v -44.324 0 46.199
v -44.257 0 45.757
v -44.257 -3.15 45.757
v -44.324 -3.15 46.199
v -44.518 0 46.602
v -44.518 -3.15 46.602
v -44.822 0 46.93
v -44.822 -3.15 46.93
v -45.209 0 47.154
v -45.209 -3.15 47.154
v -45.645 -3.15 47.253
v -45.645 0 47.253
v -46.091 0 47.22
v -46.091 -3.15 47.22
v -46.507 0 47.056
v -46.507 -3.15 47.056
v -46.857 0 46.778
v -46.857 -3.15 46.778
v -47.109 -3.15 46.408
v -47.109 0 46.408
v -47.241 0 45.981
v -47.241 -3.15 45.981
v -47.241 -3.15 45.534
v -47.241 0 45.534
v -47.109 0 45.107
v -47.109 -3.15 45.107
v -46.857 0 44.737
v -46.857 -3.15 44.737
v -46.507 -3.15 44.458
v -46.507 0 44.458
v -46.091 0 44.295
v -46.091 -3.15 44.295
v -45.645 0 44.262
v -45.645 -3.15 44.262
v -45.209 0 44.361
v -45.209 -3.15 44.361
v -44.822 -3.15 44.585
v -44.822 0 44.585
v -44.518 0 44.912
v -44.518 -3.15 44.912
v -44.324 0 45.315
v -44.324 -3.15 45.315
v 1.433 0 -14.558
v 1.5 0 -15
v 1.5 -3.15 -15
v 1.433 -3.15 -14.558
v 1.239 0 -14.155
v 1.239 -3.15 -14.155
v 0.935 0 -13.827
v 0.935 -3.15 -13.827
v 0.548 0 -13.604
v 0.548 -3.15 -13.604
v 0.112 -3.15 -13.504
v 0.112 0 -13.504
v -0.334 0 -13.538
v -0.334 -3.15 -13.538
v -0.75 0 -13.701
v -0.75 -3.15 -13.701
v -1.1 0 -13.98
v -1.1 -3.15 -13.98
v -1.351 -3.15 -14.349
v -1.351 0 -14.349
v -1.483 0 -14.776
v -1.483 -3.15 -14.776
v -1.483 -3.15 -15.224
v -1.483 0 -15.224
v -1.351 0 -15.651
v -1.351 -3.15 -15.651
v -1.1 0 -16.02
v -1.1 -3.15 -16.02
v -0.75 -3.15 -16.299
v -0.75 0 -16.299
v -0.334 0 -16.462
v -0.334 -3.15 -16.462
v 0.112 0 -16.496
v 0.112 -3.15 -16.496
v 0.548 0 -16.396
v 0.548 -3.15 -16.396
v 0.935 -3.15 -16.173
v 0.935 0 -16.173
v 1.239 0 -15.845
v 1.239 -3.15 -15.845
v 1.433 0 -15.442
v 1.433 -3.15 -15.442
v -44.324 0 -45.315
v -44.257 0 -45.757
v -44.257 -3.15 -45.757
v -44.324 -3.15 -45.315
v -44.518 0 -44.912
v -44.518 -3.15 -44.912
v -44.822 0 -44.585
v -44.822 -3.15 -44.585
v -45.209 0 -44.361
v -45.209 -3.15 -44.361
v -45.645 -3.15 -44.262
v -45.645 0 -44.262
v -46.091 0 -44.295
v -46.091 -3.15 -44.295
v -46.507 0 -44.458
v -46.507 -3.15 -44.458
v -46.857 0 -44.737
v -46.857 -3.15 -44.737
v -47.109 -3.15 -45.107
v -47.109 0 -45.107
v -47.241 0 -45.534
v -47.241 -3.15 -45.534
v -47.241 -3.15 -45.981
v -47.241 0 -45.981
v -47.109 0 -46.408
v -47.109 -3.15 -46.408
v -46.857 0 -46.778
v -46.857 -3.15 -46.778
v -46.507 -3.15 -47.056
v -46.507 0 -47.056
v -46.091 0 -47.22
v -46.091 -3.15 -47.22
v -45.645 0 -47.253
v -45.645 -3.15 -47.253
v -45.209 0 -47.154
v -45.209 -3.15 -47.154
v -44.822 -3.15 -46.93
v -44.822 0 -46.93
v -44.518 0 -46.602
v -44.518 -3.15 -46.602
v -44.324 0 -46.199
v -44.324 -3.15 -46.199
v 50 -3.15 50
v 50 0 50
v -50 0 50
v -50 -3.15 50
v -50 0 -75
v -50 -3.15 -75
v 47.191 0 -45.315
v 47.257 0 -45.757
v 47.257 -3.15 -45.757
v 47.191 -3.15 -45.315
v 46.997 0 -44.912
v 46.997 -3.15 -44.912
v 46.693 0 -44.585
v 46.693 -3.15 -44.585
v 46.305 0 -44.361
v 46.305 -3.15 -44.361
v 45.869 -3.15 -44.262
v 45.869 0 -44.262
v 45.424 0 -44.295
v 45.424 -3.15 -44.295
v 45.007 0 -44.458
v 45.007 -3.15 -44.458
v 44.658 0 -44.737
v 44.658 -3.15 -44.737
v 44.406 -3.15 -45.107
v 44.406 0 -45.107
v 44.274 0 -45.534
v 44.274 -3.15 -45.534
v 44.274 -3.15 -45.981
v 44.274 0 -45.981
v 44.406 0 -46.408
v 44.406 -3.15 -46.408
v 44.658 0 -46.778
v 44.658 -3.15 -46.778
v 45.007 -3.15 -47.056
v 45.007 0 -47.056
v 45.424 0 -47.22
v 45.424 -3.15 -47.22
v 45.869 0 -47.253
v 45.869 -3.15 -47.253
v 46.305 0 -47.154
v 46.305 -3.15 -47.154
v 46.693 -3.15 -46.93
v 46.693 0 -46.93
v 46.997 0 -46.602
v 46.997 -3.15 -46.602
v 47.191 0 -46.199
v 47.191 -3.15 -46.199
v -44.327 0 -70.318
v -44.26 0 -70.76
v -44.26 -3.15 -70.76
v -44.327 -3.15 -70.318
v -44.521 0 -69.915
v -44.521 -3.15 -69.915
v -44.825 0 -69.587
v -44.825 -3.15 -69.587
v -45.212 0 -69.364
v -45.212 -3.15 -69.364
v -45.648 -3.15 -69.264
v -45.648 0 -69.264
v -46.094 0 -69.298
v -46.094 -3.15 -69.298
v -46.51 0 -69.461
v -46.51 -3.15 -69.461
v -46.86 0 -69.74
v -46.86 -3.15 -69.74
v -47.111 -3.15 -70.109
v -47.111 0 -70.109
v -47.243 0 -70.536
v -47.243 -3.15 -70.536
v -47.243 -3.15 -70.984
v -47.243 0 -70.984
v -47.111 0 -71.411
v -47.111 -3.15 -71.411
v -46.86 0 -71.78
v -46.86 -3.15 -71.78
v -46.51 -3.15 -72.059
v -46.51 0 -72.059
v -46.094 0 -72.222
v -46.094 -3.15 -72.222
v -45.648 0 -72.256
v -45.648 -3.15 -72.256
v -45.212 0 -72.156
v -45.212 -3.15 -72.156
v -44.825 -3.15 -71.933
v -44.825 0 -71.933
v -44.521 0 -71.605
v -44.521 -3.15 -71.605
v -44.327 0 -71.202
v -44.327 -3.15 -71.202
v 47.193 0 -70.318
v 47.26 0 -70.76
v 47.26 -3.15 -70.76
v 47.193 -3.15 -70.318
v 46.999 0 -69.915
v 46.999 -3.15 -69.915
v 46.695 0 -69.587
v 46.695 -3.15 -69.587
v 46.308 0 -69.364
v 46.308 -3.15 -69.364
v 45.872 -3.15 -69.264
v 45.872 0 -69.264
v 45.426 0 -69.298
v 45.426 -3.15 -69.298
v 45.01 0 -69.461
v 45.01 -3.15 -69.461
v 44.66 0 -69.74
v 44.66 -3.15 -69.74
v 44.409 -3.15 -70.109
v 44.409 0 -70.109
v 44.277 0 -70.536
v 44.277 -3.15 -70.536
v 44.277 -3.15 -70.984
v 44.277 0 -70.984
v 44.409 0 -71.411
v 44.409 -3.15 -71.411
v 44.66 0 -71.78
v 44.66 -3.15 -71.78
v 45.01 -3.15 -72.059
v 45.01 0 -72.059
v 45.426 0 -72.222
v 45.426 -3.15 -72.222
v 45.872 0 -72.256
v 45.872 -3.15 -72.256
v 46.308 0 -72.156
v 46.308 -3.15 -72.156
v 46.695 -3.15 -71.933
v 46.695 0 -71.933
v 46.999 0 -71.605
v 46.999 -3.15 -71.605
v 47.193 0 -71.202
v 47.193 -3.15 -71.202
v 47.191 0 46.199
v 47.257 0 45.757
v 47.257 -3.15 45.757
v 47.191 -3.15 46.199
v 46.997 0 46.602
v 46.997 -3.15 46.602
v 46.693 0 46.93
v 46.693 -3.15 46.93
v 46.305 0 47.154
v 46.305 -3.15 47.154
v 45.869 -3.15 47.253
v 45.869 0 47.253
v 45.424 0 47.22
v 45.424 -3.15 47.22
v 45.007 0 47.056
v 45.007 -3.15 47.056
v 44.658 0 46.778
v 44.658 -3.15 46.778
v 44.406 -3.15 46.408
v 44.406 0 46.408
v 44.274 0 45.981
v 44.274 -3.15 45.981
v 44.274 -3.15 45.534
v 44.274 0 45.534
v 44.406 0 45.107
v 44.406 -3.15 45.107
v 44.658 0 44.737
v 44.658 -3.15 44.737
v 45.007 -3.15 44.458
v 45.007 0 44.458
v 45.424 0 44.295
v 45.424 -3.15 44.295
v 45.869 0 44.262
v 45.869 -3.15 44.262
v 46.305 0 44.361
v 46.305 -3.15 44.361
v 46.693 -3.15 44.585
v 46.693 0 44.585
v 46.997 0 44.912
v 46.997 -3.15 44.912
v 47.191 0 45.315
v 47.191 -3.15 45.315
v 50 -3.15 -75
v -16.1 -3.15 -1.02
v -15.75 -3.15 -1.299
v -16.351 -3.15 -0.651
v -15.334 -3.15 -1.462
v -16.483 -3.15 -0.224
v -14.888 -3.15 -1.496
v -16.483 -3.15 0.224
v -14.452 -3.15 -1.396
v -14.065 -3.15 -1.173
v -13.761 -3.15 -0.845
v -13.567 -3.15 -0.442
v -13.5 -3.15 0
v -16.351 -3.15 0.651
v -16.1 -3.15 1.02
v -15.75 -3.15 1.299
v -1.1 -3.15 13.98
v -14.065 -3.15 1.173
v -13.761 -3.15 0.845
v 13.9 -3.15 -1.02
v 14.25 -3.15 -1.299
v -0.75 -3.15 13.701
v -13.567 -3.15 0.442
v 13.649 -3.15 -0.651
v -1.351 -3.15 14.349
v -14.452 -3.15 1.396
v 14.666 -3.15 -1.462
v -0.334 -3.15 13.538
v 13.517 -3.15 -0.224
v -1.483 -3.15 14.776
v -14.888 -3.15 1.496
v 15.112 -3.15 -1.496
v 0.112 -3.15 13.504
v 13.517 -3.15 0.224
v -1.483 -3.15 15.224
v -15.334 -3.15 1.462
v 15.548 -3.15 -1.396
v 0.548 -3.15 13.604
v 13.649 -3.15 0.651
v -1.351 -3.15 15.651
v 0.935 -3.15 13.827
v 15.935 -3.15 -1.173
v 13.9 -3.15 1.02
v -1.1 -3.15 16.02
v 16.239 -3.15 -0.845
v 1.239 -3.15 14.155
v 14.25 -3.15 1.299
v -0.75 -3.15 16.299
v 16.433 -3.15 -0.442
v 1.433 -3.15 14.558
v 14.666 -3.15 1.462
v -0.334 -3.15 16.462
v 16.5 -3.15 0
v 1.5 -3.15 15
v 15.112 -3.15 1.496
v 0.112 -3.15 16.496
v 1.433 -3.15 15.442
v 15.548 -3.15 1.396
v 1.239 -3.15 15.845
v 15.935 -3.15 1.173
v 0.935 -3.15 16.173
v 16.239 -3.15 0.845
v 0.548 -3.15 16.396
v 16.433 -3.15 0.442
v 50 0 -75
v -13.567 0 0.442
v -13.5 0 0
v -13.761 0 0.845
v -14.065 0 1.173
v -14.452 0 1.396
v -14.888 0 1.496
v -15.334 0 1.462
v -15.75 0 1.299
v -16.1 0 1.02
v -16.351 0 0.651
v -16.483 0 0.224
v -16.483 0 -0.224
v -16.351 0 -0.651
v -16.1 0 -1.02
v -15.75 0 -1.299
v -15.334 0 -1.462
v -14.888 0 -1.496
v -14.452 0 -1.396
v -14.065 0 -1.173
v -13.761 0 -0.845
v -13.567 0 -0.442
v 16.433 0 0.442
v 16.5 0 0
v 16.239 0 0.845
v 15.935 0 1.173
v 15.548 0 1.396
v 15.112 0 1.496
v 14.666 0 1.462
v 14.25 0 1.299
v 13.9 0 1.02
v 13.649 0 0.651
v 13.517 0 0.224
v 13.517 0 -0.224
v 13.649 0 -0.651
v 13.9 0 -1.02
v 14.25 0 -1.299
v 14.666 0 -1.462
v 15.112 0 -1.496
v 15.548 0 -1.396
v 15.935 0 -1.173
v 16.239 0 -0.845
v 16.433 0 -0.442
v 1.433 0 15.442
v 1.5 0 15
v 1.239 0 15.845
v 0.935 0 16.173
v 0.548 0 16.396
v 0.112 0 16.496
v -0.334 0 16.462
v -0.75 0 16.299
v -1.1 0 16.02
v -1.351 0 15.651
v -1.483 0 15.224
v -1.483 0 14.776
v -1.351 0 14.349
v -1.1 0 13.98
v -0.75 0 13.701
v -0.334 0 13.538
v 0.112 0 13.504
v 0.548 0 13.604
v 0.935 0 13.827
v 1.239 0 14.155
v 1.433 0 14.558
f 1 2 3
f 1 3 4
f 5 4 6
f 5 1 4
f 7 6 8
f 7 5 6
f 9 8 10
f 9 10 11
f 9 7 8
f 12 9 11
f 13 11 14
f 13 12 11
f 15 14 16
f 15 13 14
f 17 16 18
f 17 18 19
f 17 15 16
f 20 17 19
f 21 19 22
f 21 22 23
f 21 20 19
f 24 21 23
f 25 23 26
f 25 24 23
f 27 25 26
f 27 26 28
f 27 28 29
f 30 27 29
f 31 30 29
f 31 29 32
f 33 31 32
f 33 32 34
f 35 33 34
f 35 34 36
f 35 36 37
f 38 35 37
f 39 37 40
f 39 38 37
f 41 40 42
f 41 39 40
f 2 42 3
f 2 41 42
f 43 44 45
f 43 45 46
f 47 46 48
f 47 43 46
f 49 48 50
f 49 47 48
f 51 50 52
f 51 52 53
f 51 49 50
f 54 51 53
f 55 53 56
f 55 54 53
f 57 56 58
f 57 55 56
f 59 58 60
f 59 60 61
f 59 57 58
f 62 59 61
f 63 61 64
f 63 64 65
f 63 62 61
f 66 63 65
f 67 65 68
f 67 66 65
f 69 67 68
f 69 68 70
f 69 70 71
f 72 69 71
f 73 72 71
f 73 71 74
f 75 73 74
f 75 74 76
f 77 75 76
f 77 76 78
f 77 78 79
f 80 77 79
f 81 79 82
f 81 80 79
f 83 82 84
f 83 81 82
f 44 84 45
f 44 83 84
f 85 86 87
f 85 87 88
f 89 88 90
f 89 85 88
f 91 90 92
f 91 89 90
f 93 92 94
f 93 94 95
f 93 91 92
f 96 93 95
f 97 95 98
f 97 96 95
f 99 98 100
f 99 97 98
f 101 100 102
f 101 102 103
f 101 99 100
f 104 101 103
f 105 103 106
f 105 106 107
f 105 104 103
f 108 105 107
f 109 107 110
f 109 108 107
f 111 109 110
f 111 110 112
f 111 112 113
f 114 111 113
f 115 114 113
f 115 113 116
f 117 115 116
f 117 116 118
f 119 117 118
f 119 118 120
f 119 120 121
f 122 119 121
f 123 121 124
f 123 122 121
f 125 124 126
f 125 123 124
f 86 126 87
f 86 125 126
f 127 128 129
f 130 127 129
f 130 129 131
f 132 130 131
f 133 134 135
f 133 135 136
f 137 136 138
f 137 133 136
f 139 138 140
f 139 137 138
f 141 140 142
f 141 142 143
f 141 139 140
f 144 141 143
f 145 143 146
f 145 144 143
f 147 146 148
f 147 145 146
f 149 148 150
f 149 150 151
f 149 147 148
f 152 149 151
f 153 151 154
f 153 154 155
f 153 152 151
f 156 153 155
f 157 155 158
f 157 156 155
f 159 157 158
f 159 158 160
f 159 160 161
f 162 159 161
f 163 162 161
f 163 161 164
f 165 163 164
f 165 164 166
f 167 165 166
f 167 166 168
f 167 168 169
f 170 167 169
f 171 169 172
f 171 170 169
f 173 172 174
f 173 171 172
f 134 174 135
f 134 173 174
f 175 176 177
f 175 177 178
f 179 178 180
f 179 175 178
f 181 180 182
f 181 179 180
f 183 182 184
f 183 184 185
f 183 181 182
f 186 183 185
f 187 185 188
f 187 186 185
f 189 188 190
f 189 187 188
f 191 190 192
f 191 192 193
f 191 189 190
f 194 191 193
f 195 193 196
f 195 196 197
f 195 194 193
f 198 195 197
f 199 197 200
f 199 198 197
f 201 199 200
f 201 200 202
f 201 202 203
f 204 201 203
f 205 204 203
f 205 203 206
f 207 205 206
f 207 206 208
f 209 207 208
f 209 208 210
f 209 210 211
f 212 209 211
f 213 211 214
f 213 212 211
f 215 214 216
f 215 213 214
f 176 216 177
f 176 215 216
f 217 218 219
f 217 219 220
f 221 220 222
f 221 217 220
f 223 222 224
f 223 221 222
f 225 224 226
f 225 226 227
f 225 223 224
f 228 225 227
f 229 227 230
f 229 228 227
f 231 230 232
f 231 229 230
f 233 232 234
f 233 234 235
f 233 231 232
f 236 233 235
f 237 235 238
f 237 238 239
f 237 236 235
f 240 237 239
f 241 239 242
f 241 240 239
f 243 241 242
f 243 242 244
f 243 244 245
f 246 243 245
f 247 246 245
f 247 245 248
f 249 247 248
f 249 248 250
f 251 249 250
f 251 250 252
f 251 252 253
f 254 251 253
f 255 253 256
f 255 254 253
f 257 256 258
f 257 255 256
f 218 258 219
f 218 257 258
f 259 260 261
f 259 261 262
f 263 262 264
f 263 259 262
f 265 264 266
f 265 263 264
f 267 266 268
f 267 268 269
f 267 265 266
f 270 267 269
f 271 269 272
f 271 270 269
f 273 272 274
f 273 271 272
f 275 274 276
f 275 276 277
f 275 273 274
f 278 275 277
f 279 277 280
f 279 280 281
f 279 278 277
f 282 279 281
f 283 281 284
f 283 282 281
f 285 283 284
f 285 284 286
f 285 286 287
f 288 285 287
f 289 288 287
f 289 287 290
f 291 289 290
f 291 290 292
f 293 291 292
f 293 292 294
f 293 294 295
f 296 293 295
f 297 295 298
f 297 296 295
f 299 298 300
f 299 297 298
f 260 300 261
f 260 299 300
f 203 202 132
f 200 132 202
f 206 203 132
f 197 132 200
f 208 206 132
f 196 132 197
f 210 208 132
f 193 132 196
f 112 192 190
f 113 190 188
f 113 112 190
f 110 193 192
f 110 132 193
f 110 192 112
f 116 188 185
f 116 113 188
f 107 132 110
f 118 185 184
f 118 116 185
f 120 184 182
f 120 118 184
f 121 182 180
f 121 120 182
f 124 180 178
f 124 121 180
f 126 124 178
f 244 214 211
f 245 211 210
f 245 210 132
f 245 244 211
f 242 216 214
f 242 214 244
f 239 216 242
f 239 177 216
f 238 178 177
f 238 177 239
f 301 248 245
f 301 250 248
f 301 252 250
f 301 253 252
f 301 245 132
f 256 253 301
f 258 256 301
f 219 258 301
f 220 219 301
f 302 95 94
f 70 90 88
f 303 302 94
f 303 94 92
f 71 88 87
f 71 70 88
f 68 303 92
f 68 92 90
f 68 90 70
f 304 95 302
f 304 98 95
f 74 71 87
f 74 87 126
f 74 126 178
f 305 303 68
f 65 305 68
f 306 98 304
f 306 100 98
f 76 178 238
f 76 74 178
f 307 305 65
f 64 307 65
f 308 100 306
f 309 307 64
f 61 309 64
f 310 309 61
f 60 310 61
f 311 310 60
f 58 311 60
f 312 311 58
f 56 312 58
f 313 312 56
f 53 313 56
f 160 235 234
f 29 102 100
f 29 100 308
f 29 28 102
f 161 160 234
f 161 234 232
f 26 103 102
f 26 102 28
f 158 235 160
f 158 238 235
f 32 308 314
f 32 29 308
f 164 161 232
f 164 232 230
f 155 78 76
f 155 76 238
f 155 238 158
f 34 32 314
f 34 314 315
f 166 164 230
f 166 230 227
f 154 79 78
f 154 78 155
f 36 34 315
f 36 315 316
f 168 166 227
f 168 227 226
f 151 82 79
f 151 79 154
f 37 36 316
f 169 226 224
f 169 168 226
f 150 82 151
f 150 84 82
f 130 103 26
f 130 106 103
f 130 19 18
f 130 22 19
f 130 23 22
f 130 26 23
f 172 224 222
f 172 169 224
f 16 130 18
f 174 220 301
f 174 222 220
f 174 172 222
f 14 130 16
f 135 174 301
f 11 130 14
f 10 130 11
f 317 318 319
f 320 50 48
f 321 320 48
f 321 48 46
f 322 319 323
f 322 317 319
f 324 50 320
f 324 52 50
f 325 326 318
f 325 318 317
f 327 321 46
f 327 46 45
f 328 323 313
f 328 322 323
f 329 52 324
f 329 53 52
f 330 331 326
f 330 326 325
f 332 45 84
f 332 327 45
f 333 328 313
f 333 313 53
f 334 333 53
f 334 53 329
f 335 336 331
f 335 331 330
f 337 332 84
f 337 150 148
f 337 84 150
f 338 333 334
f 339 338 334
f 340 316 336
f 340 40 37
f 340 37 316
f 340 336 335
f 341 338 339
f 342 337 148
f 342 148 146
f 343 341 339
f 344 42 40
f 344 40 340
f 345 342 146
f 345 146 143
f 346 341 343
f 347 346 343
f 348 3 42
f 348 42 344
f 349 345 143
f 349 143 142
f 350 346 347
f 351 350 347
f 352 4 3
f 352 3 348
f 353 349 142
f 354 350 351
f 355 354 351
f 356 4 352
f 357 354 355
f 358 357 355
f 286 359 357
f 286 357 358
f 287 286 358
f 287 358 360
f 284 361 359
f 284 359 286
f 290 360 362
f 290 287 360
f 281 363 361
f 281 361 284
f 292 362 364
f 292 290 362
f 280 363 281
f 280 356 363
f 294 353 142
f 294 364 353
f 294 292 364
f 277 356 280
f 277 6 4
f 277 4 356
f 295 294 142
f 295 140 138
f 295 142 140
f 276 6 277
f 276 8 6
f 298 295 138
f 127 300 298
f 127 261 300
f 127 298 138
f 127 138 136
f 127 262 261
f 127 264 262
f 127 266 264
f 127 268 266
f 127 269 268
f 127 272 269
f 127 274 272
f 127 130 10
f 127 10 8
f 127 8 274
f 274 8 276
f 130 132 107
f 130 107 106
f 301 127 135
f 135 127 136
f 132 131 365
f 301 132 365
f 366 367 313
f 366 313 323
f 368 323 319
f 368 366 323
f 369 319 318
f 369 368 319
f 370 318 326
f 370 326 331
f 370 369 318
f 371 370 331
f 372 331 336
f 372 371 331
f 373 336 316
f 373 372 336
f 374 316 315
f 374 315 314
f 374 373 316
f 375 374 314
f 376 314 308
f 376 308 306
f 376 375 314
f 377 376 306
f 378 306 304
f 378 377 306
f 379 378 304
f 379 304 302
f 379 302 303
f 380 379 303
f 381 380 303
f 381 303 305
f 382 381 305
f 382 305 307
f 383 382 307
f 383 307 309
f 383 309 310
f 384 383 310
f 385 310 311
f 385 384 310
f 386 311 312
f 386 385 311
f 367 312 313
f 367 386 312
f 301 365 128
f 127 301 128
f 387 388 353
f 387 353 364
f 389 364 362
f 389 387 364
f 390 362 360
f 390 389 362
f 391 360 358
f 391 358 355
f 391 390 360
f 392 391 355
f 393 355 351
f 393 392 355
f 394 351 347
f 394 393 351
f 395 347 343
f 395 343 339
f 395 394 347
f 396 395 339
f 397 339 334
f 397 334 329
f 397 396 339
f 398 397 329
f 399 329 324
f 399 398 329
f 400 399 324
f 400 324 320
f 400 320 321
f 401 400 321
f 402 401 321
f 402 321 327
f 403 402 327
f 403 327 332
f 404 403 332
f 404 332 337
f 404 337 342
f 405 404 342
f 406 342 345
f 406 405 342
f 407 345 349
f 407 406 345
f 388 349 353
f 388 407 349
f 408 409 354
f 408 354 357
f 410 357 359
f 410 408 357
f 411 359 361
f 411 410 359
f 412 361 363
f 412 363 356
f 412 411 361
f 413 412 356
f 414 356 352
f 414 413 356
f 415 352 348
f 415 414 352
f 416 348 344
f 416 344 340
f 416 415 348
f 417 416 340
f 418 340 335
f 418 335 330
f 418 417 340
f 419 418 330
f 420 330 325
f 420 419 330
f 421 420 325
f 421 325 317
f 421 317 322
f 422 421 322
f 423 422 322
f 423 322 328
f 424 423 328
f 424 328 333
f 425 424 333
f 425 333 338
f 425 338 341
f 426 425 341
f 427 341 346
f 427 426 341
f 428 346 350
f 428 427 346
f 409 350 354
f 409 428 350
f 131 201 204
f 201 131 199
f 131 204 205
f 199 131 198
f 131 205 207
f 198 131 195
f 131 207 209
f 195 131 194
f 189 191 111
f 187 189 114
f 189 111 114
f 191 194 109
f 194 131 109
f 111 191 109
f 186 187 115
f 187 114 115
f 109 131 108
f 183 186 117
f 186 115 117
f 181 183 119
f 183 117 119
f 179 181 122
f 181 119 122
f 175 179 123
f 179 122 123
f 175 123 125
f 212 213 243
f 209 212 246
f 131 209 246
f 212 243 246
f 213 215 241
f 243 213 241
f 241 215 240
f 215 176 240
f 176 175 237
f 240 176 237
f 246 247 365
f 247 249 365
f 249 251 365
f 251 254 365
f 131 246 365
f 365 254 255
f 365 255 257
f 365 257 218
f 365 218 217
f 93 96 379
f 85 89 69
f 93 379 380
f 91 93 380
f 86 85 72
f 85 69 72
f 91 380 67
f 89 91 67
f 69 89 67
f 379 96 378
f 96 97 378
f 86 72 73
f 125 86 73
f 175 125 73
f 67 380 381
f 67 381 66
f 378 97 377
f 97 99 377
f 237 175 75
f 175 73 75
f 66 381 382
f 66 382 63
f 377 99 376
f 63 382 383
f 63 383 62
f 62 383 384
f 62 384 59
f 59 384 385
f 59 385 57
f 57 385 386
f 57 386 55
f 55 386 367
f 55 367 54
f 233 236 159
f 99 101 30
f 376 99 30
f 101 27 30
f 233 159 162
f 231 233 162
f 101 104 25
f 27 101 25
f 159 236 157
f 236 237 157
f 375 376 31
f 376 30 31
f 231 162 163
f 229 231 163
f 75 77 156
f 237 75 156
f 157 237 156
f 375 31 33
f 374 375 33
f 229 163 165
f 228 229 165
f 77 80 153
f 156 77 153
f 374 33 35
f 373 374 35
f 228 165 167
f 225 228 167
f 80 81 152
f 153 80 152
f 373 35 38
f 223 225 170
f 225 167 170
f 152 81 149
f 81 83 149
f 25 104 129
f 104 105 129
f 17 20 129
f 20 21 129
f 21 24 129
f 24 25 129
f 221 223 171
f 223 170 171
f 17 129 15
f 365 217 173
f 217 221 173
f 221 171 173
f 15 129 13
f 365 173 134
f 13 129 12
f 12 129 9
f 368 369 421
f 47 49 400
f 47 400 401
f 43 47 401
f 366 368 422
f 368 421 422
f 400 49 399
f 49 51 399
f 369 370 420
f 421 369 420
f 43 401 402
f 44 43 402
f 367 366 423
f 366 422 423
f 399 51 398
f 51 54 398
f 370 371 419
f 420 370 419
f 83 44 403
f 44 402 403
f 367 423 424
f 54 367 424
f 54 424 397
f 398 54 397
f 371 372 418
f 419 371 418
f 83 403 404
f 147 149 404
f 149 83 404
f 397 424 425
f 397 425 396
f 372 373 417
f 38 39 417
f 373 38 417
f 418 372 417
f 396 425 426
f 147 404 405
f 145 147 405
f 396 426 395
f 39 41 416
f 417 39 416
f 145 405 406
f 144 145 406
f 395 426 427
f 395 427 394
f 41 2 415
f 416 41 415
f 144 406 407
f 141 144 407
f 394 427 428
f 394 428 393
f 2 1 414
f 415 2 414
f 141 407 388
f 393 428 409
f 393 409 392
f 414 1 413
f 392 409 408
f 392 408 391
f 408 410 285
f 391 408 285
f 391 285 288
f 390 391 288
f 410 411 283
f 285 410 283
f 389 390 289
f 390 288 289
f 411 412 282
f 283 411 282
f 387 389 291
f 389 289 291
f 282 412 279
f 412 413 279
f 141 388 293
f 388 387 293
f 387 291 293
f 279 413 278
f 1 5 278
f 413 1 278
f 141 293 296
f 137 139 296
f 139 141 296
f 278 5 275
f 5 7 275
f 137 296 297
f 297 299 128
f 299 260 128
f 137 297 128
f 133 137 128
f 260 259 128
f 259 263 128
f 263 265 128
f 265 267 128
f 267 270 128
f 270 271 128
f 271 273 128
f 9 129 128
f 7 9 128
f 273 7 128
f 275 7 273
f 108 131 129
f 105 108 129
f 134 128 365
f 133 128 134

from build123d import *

# Parameters (mm, degrees)
F0_R     = 1.5
F1_DEPTH = 3.15


with BuildPart() as f1:
    # F0 (on Front) → F1 (new body)
    with BuildSketch(Plane.XZ):
        Polygon((50, -50), (50, 50), (-50, 50), (-50, -50), (-50, -75), (50, -75), align=None)
        with Locations((-45.76, -70.76)):
            Circle(F0_R, mode=Mode.SUBTRACT)
        with Locations((-45.757359, -45.757359)):
            Circle(F0_R, mode=Mode.SUBTRACT)
        with Locations((45.76, -70.76)):
            Circle(F0_R, mode=Mode.SUBTRACT)
        with Locations((45.757359, -45.757359)):
            Circle(F0_R, mode=Mode.SUBTRACT)
        with Locations((0, -15)):
            Circle(F0_R, mode=Mode.SUBTRACT)
        with Locations((-15, 0)):
            Circle(F0_R, mode=Mode.SUBTRACT)
        with Locations((-45.757359, 45.757359)):
            Circle(F0_R, mode=Mode.SUBTRACT)
        with Locations((15, 0)):
            Circle(F0_R, mode=Mode.SUBTRACT)
        with Locations((0, 15)):
            Circle(F0_R, mode=Mode.SUBTRACT)
        with Locations((45.757359, 45.757359)):
            Circle(F0_R, mode=Mode.SUBTRACT)
    extrude(amount=F1_DEPTH)


solid = f1.part
